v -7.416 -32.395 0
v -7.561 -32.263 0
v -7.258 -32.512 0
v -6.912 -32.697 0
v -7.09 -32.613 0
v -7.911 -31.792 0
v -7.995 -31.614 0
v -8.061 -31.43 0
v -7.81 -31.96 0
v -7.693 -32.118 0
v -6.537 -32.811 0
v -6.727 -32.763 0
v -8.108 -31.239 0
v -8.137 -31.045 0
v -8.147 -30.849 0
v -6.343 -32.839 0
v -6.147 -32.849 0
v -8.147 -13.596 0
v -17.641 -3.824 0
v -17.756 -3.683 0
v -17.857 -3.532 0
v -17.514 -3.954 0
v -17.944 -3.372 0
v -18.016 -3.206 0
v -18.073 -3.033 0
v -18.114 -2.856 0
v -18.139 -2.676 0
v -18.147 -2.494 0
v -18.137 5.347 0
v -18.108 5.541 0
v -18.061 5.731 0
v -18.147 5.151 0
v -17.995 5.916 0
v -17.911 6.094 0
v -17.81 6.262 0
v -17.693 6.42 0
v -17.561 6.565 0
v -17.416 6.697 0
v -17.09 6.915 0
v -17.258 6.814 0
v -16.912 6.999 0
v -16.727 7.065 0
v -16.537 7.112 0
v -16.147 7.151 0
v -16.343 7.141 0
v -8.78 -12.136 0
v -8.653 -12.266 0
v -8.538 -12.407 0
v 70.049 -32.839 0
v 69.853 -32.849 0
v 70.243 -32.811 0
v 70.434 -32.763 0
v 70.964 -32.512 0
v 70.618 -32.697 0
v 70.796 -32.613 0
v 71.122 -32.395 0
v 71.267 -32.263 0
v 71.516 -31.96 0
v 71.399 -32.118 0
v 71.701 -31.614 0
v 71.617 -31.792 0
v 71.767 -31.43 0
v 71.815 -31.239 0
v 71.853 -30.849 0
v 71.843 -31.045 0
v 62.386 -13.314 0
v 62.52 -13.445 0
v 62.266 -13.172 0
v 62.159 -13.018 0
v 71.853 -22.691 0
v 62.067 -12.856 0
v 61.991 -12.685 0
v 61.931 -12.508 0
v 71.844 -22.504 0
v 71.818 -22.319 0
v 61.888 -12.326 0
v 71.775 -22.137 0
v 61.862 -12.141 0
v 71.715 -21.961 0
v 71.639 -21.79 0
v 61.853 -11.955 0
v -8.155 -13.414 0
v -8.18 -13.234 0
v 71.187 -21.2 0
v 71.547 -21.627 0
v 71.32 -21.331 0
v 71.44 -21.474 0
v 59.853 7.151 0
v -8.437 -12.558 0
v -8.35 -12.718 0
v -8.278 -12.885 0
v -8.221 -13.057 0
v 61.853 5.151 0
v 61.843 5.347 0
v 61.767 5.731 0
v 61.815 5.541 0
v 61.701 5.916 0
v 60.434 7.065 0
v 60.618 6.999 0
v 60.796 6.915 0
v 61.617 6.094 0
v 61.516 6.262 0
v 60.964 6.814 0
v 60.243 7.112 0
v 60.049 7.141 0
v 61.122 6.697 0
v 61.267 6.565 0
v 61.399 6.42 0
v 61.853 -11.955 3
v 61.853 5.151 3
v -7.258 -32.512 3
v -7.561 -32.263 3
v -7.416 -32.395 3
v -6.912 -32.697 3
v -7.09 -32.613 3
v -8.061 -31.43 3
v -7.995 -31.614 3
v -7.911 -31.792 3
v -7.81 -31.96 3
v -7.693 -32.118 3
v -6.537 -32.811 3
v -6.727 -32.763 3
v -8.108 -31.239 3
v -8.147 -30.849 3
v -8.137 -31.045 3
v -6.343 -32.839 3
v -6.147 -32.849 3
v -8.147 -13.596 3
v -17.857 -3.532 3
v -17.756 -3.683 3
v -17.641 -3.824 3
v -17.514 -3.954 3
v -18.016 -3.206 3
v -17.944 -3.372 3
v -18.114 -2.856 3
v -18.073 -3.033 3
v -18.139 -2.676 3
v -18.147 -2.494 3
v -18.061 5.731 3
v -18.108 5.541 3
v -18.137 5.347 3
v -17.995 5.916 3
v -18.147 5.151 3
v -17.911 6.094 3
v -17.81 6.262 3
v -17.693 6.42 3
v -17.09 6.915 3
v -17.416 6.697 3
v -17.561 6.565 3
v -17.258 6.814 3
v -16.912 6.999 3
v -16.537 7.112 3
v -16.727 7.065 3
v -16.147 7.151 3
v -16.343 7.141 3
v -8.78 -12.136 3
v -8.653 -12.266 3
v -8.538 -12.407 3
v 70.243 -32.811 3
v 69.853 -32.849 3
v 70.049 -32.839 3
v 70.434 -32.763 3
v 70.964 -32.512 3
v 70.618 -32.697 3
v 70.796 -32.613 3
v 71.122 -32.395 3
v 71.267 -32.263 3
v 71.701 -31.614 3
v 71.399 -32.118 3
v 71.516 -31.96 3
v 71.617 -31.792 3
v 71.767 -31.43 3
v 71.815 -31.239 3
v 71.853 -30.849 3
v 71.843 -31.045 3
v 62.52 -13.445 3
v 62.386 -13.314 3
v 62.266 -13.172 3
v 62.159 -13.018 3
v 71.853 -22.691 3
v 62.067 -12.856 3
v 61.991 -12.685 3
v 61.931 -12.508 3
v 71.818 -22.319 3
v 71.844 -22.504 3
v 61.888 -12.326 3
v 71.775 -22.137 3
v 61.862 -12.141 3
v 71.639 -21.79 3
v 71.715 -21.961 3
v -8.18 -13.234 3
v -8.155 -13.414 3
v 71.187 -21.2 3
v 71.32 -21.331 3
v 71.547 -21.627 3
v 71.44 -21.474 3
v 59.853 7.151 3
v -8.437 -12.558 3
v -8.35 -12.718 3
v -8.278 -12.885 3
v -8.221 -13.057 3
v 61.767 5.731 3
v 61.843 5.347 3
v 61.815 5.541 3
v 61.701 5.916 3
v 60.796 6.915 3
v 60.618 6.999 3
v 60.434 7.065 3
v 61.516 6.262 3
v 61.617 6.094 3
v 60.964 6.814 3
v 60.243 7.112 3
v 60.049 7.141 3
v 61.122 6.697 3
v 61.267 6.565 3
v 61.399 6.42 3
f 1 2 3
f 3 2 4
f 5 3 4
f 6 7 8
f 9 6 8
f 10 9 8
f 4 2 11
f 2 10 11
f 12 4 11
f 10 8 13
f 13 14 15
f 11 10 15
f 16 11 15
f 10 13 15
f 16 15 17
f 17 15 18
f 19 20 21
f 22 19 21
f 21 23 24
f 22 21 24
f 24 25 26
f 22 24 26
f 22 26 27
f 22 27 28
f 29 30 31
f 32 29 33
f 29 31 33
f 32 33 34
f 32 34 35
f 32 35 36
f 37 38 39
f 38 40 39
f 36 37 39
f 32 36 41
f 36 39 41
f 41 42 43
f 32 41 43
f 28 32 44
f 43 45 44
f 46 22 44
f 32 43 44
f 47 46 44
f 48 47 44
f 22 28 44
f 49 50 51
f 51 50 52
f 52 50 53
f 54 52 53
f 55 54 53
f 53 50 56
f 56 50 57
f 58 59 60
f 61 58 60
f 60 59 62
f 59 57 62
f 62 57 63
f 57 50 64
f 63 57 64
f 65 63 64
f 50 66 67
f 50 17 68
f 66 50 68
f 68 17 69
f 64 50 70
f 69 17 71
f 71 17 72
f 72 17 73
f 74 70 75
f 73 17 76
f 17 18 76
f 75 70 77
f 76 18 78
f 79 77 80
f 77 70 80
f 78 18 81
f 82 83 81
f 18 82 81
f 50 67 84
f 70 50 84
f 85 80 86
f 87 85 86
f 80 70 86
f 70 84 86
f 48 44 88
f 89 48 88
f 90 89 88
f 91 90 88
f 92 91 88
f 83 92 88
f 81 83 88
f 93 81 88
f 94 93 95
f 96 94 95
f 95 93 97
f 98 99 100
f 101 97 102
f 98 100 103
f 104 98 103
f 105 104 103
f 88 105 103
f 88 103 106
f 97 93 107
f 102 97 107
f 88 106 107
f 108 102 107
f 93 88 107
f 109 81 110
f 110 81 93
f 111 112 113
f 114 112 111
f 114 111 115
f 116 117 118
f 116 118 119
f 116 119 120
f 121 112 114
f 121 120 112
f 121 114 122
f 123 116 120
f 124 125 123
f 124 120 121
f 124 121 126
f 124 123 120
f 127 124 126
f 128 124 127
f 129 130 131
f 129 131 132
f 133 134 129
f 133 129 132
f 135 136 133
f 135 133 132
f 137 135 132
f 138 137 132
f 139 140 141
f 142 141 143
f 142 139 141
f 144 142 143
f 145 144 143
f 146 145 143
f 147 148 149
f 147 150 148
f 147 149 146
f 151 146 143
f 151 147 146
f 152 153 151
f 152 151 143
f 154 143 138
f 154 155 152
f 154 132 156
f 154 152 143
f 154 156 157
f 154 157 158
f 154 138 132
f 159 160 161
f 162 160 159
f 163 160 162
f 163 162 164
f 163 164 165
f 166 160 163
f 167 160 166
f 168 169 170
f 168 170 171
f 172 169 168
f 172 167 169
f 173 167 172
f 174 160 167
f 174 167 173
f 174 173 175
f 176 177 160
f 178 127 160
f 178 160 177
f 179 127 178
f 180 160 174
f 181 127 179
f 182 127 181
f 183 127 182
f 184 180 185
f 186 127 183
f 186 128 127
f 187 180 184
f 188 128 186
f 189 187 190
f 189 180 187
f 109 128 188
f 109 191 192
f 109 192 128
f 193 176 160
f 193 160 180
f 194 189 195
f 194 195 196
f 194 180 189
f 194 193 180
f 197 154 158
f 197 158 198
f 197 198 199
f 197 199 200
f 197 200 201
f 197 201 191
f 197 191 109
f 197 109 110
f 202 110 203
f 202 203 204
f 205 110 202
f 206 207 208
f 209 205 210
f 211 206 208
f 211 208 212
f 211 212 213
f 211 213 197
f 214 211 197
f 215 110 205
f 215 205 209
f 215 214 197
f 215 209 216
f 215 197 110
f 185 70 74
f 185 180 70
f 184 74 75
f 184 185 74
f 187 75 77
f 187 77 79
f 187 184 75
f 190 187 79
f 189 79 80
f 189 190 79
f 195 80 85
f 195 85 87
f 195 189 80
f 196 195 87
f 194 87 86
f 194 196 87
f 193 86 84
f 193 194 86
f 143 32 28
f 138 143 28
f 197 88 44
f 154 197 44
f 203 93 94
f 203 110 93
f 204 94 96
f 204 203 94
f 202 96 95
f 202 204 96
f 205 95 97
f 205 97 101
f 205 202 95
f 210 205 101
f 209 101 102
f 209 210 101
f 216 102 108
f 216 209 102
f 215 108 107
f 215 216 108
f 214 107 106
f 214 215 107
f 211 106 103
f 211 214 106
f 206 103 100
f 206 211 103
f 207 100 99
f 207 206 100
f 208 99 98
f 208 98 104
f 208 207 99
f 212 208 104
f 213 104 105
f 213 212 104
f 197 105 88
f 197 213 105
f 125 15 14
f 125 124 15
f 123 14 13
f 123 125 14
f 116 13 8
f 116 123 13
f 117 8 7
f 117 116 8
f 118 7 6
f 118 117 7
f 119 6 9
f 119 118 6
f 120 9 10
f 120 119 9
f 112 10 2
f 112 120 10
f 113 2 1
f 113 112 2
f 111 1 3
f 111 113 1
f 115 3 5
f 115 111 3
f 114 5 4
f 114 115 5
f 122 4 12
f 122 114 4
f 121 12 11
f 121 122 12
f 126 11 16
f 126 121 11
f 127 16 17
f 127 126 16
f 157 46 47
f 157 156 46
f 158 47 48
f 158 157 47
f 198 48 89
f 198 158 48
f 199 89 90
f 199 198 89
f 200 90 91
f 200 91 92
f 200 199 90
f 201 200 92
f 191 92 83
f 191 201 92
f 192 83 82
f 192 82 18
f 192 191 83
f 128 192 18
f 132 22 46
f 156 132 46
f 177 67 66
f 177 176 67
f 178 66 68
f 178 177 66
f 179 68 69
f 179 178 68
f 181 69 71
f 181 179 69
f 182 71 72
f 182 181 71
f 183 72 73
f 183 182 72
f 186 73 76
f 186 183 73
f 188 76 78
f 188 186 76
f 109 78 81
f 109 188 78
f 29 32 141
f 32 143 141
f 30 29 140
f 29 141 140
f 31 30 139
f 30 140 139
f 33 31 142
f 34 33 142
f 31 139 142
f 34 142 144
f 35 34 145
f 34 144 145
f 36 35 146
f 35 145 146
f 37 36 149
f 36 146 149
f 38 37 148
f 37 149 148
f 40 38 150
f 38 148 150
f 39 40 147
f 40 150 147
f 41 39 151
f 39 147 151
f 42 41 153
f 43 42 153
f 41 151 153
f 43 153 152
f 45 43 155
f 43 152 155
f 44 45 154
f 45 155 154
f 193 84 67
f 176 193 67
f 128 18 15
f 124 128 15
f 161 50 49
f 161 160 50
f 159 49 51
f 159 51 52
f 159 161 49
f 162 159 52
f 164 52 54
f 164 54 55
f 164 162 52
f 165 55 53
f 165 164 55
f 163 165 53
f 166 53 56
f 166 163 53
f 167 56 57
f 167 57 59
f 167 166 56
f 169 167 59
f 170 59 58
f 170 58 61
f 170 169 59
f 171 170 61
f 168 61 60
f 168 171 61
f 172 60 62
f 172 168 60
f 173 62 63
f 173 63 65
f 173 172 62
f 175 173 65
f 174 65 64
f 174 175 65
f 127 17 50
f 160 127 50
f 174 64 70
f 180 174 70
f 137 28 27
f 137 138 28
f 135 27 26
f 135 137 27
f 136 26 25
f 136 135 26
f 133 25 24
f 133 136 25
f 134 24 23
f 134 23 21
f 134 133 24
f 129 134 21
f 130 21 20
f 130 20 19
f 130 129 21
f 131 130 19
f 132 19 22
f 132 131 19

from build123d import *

# Parameters (mm, degrees)
F1_DEPTH = 3
F2_R     = 2


with BuildPart() as f1:
    # F0 (on Top) → F1 (new body)
    with BuildSketch(Plane.XY):
        Polygon((-8.146908, 7.150882), (-18.146908, 7.150882), (-18.146908, -3.36134), (-8.146908, -12.728843), align=None)
        Polygon((61.853092, 7.150882), (-8.146908, 7.150882), (-8.146908, -12.728843), (-8.146908, -32.849118), (61.853092, -32.849118), (61.853092, -12.849118), align=None)
        Polygon((71.853092, -21.79648), (61.853092, -12.849118), (61.853092, -32.849118), (71.853092, -32.849118), align=None)
    extrude(amount=F1_DEPTH)

    # F2
    f2_edges = [f1.edges().sort_by_distance(p)[0] for p in [
        (-18.146908, 7.150882, 1.5),
        (-18.146908, -3.36134, 1.5),
        (-8.146908, -12.728843, 1.5),
        (-8.146908, -32.849118, 1.5),
        (71.853092, -32.849118, 1.5),
        (71.853092, -21.79648, 1.5),
        (61.853092, -12.849118, 1.5),
        (61.853092, 7.150882, 1.5),
    ]]
    fillet(f2_edges, radius=F2_R)


solid = f1.part
